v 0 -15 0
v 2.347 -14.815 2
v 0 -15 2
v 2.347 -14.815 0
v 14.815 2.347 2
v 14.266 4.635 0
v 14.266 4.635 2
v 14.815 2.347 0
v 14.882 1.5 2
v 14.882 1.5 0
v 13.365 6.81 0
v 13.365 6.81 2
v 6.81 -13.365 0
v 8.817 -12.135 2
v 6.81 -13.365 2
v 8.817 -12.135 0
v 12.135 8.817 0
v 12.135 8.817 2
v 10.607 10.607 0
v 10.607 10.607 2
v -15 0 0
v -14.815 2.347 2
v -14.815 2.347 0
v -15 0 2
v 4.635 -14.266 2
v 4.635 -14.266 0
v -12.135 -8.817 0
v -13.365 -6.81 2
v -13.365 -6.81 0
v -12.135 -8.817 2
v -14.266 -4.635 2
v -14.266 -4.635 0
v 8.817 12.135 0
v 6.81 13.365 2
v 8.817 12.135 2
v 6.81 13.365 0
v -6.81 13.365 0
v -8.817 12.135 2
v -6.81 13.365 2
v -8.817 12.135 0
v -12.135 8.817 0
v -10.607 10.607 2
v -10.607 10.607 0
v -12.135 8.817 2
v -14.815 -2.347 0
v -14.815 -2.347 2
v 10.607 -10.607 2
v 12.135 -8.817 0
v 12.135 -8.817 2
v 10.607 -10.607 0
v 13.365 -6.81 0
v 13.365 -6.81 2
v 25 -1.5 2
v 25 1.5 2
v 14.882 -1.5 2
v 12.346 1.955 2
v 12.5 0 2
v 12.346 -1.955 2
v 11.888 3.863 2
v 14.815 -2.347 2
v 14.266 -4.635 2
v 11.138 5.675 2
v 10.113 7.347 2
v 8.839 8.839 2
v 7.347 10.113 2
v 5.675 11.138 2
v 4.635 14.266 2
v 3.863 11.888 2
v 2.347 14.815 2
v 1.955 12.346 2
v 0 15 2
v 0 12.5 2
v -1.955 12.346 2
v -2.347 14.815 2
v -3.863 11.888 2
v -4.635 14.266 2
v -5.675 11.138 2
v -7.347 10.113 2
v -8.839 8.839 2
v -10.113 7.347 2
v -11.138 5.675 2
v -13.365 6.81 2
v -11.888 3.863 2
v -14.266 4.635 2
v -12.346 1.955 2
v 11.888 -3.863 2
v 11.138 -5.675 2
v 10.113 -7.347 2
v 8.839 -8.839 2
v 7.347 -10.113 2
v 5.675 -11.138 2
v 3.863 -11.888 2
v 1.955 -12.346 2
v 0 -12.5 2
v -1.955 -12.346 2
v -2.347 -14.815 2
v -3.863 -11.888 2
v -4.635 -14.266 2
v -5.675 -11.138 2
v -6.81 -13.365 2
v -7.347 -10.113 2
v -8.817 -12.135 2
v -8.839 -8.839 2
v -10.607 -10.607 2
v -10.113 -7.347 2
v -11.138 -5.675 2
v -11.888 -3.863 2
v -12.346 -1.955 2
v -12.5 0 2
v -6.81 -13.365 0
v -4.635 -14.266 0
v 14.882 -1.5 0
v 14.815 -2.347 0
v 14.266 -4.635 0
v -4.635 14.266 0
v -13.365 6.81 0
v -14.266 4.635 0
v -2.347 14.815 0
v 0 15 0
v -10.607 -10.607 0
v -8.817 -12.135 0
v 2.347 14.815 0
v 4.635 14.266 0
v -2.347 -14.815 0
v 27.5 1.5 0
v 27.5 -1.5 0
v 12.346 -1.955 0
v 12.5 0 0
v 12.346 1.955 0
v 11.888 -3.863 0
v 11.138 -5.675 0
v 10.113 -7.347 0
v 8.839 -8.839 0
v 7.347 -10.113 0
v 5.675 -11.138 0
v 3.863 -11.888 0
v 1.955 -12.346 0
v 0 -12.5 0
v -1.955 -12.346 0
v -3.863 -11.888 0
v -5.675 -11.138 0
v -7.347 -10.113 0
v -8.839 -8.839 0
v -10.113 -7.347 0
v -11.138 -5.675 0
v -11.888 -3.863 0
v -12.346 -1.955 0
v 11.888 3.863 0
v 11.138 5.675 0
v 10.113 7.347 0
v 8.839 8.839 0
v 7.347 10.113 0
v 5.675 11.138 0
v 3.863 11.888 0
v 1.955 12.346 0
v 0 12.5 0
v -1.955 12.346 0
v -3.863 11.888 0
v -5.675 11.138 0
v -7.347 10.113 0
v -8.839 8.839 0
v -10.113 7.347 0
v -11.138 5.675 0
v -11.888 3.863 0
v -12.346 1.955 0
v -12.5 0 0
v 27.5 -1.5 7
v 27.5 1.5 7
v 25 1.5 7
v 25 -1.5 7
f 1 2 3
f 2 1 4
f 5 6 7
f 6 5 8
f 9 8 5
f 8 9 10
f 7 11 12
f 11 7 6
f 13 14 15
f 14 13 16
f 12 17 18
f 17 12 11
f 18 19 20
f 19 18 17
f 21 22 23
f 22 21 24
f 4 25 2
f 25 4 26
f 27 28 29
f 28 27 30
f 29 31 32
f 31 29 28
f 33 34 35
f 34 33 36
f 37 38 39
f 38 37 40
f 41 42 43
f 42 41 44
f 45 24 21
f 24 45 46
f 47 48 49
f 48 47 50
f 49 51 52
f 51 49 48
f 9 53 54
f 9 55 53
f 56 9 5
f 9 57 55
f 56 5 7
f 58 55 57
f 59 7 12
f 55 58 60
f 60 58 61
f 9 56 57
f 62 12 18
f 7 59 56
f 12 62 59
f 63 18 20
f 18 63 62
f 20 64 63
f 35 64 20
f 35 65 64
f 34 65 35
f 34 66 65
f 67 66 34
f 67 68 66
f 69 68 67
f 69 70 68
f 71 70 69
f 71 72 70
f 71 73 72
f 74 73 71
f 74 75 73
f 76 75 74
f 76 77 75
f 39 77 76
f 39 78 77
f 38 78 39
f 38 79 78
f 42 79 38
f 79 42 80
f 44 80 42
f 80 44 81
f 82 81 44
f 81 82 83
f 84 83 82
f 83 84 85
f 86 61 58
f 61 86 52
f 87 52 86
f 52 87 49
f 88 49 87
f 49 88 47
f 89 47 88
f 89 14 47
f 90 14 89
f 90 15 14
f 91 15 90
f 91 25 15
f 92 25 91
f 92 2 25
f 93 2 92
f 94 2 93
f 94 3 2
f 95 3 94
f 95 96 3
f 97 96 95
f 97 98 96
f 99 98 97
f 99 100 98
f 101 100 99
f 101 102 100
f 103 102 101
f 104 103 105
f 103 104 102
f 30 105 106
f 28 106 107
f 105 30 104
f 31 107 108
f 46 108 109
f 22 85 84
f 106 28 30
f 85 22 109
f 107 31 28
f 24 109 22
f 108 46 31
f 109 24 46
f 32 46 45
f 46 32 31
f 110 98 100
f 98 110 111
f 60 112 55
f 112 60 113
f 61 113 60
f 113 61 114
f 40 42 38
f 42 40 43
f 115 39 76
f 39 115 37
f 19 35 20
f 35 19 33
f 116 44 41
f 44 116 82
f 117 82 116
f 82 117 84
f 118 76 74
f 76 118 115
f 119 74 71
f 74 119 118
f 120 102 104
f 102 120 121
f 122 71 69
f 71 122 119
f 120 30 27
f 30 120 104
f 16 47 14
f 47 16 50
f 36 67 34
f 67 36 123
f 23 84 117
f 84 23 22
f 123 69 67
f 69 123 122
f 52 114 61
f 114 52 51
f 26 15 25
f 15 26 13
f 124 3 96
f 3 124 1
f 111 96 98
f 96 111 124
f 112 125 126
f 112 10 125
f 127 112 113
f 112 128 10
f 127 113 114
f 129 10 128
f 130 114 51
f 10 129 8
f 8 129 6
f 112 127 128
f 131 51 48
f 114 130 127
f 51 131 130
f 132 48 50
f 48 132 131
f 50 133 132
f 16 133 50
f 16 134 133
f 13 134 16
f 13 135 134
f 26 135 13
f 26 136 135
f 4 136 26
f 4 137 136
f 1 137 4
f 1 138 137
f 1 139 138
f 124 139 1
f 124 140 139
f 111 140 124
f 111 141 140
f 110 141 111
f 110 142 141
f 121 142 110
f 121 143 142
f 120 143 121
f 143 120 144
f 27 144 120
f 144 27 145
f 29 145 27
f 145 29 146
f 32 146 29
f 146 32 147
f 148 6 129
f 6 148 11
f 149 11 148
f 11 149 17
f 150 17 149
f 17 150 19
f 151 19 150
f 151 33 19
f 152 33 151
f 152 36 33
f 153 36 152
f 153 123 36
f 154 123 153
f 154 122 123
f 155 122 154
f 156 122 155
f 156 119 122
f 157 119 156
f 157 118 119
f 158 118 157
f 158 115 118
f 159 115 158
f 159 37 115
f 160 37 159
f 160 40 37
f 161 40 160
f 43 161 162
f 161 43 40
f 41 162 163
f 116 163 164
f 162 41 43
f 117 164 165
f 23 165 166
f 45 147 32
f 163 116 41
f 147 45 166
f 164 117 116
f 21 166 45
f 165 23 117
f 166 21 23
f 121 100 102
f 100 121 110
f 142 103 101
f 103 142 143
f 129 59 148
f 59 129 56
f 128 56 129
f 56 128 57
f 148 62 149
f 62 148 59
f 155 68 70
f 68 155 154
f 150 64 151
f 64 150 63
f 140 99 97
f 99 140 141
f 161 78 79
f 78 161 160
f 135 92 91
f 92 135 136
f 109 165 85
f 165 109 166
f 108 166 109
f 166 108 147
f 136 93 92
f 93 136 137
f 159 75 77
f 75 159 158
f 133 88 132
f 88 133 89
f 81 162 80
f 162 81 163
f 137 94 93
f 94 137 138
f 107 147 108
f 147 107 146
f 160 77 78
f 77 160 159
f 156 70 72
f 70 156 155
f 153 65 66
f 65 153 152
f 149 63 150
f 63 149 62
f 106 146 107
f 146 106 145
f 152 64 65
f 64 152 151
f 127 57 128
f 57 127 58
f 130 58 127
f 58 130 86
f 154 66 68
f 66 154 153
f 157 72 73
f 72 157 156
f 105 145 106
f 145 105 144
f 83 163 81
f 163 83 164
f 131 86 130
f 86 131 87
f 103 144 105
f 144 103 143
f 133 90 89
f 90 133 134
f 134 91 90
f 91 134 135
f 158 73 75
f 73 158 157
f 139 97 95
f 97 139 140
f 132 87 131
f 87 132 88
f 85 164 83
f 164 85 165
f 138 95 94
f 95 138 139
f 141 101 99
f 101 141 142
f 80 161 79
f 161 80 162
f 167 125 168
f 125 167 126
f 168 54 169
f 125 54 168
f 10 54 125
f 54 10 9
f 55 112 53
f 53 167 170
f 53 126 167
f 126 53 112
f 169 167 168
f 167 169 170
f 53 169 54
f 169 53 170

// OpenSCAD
$fn = 40;

*knob();
*rotate([0, 90, 0]) motor_mount();
*dish();
end_stop();

eps = 1e-3;

module motor_mount() {
	motor_screw_dist = 35;
	motor_screw_offset = 8;
	motor_axle_hole = 9.5;
	motor_screw_r = 2;

	plate_d = 1.5;
	plate_h = motor_screw_dist+10;
	plate_w = 20;

	frame_t = 2;
	frame_h = 25;
	frame_w = 14.4;

	microrax_hole_d = 10;
	microrax_hole_r = 1.7;

	translate([0, 0, plate_d/2])
		plate();

	translate([0, 0, -(frame_h+frame_t)/2]) difference() {
		cube([frame_w, plate_h, frame_h+frame_t], center=true);
		translate([0, 0, frame_t/2])
			union() {
				cube([frame_w+eps, plate_h-2*frame_t, frame_h+eps], center=true);
				translate([0, -microrax_hole_d/2, -frame_h/2-frame_t/2])
					cylinder(r=microrax_hole_r, h=frame_t+eps, center=true);
				translate([0, microrax_hole_d/2, -frame_h/2-frame_t/2])
					cylinder(r=microrax_hole_r, h=frame_t+eps, center=true);
			}
	
	}

	for (i=[-1,1]) translate([i*(frame_t/2+10.4/2), 0, -10/2-frame_h-frame_t])
		difference() {
			cube([frame_t, plate_h, 10.4], center=true);
			for (j=[-1,1])
				translate([0, j*microrax_hole_d/2, 0]) 
					rotate([0, 90, 0]) 
						cylinder(r=microrax_hole_r, h=frame_t+eps,center=true);
		}

	module plate () {
		difference() { 
			translate([-(plate_w-frame_w)/2, 0, 0])
				cube([plate_w, plate_h, plate_d], center=true);
			union() {
				cylinder(r=motor_axle_hole/2, h=plate_d+eps, center=true);
				translate([-motor_screw_offset, motor_screw_dist/2, 0])
					cylinder(r=motor_screw_r, h=plate_d+eps, center=true);
				translate([-motor_screw_offset, -motor_screw_dist/2, 0])
					cylinder(r=motor_screw_r, h=plate_d+eps, center=true);
			}
		}
	}
}	

module dish () {
	dish_r = 50;
	dish_r1 = 8;
	dish_t = 2;
	dish_t1 = 3;

	difference() {
		union() {
			cylinder(r=dish_r, h=dish_t);
			translate([0, 0, dish_t]) cylinder(r=dish_r1, h=dish_t1);
		}
		axle();
	}
}

module end_stop () {
	knob_r = 10.5+2;
	th = 2.5;
	h = 2;
	len = 12;
	w = 3;
	
	translate([0, 0, h/2])
		difference() {
			cylinder(r=knob_r+th, h=h, center=true);
			cylinder(r=knob_r, h=h+eps*10, center=true);
		}
	translate([len/2+knob_r+th, 0, h/2]) {
		cube([len+1, w, h], center=true);
		translate([(len+1)/2-2.5/2, 0, 5/2+h/2])
			cube([2.5, w, 5], center=true);
	}
}

module knob () {
	knob_r1 = 10.45;
	knob_r2 = 10.6;
	knob_t = 2;
	knob_h1 = 7;
	knob_h2 = 5;

	laser_width = 10;
	laser_depth = 5;

	difference() { 
		cylinder(r=knob_r1+knob_t, h=knob_h1+knob_h2);
		union() { 
			axle();
//			translate([0, 0, knob_h2]) cylinder(r1=knob_r1, r2=knob_r2, h=knob_h1);
//			translate([0, 0, knob_h1+knob_h2-laser_depth/2])
//				cube([(2*knob_r1+knob_t)*1.2, laser_width, laser_depth], center=true);
		}
	}
}

module axle () {
	stepper_axle_r = 2.5;
	stepper_axle_d = 3;
	stepper_axle_l = 10;
	eps = 0.2;

	intersection() { 
		cylinder(r=stepper_axle_r+eps, h=stepper_axle_l);
		translate([0, 0, stepper_axle_l/2])
			cube([stepper_axle_d+2*eps, 2*(stepper_axle_r+eps), stepper_axle_l], center=true);
	}
}
